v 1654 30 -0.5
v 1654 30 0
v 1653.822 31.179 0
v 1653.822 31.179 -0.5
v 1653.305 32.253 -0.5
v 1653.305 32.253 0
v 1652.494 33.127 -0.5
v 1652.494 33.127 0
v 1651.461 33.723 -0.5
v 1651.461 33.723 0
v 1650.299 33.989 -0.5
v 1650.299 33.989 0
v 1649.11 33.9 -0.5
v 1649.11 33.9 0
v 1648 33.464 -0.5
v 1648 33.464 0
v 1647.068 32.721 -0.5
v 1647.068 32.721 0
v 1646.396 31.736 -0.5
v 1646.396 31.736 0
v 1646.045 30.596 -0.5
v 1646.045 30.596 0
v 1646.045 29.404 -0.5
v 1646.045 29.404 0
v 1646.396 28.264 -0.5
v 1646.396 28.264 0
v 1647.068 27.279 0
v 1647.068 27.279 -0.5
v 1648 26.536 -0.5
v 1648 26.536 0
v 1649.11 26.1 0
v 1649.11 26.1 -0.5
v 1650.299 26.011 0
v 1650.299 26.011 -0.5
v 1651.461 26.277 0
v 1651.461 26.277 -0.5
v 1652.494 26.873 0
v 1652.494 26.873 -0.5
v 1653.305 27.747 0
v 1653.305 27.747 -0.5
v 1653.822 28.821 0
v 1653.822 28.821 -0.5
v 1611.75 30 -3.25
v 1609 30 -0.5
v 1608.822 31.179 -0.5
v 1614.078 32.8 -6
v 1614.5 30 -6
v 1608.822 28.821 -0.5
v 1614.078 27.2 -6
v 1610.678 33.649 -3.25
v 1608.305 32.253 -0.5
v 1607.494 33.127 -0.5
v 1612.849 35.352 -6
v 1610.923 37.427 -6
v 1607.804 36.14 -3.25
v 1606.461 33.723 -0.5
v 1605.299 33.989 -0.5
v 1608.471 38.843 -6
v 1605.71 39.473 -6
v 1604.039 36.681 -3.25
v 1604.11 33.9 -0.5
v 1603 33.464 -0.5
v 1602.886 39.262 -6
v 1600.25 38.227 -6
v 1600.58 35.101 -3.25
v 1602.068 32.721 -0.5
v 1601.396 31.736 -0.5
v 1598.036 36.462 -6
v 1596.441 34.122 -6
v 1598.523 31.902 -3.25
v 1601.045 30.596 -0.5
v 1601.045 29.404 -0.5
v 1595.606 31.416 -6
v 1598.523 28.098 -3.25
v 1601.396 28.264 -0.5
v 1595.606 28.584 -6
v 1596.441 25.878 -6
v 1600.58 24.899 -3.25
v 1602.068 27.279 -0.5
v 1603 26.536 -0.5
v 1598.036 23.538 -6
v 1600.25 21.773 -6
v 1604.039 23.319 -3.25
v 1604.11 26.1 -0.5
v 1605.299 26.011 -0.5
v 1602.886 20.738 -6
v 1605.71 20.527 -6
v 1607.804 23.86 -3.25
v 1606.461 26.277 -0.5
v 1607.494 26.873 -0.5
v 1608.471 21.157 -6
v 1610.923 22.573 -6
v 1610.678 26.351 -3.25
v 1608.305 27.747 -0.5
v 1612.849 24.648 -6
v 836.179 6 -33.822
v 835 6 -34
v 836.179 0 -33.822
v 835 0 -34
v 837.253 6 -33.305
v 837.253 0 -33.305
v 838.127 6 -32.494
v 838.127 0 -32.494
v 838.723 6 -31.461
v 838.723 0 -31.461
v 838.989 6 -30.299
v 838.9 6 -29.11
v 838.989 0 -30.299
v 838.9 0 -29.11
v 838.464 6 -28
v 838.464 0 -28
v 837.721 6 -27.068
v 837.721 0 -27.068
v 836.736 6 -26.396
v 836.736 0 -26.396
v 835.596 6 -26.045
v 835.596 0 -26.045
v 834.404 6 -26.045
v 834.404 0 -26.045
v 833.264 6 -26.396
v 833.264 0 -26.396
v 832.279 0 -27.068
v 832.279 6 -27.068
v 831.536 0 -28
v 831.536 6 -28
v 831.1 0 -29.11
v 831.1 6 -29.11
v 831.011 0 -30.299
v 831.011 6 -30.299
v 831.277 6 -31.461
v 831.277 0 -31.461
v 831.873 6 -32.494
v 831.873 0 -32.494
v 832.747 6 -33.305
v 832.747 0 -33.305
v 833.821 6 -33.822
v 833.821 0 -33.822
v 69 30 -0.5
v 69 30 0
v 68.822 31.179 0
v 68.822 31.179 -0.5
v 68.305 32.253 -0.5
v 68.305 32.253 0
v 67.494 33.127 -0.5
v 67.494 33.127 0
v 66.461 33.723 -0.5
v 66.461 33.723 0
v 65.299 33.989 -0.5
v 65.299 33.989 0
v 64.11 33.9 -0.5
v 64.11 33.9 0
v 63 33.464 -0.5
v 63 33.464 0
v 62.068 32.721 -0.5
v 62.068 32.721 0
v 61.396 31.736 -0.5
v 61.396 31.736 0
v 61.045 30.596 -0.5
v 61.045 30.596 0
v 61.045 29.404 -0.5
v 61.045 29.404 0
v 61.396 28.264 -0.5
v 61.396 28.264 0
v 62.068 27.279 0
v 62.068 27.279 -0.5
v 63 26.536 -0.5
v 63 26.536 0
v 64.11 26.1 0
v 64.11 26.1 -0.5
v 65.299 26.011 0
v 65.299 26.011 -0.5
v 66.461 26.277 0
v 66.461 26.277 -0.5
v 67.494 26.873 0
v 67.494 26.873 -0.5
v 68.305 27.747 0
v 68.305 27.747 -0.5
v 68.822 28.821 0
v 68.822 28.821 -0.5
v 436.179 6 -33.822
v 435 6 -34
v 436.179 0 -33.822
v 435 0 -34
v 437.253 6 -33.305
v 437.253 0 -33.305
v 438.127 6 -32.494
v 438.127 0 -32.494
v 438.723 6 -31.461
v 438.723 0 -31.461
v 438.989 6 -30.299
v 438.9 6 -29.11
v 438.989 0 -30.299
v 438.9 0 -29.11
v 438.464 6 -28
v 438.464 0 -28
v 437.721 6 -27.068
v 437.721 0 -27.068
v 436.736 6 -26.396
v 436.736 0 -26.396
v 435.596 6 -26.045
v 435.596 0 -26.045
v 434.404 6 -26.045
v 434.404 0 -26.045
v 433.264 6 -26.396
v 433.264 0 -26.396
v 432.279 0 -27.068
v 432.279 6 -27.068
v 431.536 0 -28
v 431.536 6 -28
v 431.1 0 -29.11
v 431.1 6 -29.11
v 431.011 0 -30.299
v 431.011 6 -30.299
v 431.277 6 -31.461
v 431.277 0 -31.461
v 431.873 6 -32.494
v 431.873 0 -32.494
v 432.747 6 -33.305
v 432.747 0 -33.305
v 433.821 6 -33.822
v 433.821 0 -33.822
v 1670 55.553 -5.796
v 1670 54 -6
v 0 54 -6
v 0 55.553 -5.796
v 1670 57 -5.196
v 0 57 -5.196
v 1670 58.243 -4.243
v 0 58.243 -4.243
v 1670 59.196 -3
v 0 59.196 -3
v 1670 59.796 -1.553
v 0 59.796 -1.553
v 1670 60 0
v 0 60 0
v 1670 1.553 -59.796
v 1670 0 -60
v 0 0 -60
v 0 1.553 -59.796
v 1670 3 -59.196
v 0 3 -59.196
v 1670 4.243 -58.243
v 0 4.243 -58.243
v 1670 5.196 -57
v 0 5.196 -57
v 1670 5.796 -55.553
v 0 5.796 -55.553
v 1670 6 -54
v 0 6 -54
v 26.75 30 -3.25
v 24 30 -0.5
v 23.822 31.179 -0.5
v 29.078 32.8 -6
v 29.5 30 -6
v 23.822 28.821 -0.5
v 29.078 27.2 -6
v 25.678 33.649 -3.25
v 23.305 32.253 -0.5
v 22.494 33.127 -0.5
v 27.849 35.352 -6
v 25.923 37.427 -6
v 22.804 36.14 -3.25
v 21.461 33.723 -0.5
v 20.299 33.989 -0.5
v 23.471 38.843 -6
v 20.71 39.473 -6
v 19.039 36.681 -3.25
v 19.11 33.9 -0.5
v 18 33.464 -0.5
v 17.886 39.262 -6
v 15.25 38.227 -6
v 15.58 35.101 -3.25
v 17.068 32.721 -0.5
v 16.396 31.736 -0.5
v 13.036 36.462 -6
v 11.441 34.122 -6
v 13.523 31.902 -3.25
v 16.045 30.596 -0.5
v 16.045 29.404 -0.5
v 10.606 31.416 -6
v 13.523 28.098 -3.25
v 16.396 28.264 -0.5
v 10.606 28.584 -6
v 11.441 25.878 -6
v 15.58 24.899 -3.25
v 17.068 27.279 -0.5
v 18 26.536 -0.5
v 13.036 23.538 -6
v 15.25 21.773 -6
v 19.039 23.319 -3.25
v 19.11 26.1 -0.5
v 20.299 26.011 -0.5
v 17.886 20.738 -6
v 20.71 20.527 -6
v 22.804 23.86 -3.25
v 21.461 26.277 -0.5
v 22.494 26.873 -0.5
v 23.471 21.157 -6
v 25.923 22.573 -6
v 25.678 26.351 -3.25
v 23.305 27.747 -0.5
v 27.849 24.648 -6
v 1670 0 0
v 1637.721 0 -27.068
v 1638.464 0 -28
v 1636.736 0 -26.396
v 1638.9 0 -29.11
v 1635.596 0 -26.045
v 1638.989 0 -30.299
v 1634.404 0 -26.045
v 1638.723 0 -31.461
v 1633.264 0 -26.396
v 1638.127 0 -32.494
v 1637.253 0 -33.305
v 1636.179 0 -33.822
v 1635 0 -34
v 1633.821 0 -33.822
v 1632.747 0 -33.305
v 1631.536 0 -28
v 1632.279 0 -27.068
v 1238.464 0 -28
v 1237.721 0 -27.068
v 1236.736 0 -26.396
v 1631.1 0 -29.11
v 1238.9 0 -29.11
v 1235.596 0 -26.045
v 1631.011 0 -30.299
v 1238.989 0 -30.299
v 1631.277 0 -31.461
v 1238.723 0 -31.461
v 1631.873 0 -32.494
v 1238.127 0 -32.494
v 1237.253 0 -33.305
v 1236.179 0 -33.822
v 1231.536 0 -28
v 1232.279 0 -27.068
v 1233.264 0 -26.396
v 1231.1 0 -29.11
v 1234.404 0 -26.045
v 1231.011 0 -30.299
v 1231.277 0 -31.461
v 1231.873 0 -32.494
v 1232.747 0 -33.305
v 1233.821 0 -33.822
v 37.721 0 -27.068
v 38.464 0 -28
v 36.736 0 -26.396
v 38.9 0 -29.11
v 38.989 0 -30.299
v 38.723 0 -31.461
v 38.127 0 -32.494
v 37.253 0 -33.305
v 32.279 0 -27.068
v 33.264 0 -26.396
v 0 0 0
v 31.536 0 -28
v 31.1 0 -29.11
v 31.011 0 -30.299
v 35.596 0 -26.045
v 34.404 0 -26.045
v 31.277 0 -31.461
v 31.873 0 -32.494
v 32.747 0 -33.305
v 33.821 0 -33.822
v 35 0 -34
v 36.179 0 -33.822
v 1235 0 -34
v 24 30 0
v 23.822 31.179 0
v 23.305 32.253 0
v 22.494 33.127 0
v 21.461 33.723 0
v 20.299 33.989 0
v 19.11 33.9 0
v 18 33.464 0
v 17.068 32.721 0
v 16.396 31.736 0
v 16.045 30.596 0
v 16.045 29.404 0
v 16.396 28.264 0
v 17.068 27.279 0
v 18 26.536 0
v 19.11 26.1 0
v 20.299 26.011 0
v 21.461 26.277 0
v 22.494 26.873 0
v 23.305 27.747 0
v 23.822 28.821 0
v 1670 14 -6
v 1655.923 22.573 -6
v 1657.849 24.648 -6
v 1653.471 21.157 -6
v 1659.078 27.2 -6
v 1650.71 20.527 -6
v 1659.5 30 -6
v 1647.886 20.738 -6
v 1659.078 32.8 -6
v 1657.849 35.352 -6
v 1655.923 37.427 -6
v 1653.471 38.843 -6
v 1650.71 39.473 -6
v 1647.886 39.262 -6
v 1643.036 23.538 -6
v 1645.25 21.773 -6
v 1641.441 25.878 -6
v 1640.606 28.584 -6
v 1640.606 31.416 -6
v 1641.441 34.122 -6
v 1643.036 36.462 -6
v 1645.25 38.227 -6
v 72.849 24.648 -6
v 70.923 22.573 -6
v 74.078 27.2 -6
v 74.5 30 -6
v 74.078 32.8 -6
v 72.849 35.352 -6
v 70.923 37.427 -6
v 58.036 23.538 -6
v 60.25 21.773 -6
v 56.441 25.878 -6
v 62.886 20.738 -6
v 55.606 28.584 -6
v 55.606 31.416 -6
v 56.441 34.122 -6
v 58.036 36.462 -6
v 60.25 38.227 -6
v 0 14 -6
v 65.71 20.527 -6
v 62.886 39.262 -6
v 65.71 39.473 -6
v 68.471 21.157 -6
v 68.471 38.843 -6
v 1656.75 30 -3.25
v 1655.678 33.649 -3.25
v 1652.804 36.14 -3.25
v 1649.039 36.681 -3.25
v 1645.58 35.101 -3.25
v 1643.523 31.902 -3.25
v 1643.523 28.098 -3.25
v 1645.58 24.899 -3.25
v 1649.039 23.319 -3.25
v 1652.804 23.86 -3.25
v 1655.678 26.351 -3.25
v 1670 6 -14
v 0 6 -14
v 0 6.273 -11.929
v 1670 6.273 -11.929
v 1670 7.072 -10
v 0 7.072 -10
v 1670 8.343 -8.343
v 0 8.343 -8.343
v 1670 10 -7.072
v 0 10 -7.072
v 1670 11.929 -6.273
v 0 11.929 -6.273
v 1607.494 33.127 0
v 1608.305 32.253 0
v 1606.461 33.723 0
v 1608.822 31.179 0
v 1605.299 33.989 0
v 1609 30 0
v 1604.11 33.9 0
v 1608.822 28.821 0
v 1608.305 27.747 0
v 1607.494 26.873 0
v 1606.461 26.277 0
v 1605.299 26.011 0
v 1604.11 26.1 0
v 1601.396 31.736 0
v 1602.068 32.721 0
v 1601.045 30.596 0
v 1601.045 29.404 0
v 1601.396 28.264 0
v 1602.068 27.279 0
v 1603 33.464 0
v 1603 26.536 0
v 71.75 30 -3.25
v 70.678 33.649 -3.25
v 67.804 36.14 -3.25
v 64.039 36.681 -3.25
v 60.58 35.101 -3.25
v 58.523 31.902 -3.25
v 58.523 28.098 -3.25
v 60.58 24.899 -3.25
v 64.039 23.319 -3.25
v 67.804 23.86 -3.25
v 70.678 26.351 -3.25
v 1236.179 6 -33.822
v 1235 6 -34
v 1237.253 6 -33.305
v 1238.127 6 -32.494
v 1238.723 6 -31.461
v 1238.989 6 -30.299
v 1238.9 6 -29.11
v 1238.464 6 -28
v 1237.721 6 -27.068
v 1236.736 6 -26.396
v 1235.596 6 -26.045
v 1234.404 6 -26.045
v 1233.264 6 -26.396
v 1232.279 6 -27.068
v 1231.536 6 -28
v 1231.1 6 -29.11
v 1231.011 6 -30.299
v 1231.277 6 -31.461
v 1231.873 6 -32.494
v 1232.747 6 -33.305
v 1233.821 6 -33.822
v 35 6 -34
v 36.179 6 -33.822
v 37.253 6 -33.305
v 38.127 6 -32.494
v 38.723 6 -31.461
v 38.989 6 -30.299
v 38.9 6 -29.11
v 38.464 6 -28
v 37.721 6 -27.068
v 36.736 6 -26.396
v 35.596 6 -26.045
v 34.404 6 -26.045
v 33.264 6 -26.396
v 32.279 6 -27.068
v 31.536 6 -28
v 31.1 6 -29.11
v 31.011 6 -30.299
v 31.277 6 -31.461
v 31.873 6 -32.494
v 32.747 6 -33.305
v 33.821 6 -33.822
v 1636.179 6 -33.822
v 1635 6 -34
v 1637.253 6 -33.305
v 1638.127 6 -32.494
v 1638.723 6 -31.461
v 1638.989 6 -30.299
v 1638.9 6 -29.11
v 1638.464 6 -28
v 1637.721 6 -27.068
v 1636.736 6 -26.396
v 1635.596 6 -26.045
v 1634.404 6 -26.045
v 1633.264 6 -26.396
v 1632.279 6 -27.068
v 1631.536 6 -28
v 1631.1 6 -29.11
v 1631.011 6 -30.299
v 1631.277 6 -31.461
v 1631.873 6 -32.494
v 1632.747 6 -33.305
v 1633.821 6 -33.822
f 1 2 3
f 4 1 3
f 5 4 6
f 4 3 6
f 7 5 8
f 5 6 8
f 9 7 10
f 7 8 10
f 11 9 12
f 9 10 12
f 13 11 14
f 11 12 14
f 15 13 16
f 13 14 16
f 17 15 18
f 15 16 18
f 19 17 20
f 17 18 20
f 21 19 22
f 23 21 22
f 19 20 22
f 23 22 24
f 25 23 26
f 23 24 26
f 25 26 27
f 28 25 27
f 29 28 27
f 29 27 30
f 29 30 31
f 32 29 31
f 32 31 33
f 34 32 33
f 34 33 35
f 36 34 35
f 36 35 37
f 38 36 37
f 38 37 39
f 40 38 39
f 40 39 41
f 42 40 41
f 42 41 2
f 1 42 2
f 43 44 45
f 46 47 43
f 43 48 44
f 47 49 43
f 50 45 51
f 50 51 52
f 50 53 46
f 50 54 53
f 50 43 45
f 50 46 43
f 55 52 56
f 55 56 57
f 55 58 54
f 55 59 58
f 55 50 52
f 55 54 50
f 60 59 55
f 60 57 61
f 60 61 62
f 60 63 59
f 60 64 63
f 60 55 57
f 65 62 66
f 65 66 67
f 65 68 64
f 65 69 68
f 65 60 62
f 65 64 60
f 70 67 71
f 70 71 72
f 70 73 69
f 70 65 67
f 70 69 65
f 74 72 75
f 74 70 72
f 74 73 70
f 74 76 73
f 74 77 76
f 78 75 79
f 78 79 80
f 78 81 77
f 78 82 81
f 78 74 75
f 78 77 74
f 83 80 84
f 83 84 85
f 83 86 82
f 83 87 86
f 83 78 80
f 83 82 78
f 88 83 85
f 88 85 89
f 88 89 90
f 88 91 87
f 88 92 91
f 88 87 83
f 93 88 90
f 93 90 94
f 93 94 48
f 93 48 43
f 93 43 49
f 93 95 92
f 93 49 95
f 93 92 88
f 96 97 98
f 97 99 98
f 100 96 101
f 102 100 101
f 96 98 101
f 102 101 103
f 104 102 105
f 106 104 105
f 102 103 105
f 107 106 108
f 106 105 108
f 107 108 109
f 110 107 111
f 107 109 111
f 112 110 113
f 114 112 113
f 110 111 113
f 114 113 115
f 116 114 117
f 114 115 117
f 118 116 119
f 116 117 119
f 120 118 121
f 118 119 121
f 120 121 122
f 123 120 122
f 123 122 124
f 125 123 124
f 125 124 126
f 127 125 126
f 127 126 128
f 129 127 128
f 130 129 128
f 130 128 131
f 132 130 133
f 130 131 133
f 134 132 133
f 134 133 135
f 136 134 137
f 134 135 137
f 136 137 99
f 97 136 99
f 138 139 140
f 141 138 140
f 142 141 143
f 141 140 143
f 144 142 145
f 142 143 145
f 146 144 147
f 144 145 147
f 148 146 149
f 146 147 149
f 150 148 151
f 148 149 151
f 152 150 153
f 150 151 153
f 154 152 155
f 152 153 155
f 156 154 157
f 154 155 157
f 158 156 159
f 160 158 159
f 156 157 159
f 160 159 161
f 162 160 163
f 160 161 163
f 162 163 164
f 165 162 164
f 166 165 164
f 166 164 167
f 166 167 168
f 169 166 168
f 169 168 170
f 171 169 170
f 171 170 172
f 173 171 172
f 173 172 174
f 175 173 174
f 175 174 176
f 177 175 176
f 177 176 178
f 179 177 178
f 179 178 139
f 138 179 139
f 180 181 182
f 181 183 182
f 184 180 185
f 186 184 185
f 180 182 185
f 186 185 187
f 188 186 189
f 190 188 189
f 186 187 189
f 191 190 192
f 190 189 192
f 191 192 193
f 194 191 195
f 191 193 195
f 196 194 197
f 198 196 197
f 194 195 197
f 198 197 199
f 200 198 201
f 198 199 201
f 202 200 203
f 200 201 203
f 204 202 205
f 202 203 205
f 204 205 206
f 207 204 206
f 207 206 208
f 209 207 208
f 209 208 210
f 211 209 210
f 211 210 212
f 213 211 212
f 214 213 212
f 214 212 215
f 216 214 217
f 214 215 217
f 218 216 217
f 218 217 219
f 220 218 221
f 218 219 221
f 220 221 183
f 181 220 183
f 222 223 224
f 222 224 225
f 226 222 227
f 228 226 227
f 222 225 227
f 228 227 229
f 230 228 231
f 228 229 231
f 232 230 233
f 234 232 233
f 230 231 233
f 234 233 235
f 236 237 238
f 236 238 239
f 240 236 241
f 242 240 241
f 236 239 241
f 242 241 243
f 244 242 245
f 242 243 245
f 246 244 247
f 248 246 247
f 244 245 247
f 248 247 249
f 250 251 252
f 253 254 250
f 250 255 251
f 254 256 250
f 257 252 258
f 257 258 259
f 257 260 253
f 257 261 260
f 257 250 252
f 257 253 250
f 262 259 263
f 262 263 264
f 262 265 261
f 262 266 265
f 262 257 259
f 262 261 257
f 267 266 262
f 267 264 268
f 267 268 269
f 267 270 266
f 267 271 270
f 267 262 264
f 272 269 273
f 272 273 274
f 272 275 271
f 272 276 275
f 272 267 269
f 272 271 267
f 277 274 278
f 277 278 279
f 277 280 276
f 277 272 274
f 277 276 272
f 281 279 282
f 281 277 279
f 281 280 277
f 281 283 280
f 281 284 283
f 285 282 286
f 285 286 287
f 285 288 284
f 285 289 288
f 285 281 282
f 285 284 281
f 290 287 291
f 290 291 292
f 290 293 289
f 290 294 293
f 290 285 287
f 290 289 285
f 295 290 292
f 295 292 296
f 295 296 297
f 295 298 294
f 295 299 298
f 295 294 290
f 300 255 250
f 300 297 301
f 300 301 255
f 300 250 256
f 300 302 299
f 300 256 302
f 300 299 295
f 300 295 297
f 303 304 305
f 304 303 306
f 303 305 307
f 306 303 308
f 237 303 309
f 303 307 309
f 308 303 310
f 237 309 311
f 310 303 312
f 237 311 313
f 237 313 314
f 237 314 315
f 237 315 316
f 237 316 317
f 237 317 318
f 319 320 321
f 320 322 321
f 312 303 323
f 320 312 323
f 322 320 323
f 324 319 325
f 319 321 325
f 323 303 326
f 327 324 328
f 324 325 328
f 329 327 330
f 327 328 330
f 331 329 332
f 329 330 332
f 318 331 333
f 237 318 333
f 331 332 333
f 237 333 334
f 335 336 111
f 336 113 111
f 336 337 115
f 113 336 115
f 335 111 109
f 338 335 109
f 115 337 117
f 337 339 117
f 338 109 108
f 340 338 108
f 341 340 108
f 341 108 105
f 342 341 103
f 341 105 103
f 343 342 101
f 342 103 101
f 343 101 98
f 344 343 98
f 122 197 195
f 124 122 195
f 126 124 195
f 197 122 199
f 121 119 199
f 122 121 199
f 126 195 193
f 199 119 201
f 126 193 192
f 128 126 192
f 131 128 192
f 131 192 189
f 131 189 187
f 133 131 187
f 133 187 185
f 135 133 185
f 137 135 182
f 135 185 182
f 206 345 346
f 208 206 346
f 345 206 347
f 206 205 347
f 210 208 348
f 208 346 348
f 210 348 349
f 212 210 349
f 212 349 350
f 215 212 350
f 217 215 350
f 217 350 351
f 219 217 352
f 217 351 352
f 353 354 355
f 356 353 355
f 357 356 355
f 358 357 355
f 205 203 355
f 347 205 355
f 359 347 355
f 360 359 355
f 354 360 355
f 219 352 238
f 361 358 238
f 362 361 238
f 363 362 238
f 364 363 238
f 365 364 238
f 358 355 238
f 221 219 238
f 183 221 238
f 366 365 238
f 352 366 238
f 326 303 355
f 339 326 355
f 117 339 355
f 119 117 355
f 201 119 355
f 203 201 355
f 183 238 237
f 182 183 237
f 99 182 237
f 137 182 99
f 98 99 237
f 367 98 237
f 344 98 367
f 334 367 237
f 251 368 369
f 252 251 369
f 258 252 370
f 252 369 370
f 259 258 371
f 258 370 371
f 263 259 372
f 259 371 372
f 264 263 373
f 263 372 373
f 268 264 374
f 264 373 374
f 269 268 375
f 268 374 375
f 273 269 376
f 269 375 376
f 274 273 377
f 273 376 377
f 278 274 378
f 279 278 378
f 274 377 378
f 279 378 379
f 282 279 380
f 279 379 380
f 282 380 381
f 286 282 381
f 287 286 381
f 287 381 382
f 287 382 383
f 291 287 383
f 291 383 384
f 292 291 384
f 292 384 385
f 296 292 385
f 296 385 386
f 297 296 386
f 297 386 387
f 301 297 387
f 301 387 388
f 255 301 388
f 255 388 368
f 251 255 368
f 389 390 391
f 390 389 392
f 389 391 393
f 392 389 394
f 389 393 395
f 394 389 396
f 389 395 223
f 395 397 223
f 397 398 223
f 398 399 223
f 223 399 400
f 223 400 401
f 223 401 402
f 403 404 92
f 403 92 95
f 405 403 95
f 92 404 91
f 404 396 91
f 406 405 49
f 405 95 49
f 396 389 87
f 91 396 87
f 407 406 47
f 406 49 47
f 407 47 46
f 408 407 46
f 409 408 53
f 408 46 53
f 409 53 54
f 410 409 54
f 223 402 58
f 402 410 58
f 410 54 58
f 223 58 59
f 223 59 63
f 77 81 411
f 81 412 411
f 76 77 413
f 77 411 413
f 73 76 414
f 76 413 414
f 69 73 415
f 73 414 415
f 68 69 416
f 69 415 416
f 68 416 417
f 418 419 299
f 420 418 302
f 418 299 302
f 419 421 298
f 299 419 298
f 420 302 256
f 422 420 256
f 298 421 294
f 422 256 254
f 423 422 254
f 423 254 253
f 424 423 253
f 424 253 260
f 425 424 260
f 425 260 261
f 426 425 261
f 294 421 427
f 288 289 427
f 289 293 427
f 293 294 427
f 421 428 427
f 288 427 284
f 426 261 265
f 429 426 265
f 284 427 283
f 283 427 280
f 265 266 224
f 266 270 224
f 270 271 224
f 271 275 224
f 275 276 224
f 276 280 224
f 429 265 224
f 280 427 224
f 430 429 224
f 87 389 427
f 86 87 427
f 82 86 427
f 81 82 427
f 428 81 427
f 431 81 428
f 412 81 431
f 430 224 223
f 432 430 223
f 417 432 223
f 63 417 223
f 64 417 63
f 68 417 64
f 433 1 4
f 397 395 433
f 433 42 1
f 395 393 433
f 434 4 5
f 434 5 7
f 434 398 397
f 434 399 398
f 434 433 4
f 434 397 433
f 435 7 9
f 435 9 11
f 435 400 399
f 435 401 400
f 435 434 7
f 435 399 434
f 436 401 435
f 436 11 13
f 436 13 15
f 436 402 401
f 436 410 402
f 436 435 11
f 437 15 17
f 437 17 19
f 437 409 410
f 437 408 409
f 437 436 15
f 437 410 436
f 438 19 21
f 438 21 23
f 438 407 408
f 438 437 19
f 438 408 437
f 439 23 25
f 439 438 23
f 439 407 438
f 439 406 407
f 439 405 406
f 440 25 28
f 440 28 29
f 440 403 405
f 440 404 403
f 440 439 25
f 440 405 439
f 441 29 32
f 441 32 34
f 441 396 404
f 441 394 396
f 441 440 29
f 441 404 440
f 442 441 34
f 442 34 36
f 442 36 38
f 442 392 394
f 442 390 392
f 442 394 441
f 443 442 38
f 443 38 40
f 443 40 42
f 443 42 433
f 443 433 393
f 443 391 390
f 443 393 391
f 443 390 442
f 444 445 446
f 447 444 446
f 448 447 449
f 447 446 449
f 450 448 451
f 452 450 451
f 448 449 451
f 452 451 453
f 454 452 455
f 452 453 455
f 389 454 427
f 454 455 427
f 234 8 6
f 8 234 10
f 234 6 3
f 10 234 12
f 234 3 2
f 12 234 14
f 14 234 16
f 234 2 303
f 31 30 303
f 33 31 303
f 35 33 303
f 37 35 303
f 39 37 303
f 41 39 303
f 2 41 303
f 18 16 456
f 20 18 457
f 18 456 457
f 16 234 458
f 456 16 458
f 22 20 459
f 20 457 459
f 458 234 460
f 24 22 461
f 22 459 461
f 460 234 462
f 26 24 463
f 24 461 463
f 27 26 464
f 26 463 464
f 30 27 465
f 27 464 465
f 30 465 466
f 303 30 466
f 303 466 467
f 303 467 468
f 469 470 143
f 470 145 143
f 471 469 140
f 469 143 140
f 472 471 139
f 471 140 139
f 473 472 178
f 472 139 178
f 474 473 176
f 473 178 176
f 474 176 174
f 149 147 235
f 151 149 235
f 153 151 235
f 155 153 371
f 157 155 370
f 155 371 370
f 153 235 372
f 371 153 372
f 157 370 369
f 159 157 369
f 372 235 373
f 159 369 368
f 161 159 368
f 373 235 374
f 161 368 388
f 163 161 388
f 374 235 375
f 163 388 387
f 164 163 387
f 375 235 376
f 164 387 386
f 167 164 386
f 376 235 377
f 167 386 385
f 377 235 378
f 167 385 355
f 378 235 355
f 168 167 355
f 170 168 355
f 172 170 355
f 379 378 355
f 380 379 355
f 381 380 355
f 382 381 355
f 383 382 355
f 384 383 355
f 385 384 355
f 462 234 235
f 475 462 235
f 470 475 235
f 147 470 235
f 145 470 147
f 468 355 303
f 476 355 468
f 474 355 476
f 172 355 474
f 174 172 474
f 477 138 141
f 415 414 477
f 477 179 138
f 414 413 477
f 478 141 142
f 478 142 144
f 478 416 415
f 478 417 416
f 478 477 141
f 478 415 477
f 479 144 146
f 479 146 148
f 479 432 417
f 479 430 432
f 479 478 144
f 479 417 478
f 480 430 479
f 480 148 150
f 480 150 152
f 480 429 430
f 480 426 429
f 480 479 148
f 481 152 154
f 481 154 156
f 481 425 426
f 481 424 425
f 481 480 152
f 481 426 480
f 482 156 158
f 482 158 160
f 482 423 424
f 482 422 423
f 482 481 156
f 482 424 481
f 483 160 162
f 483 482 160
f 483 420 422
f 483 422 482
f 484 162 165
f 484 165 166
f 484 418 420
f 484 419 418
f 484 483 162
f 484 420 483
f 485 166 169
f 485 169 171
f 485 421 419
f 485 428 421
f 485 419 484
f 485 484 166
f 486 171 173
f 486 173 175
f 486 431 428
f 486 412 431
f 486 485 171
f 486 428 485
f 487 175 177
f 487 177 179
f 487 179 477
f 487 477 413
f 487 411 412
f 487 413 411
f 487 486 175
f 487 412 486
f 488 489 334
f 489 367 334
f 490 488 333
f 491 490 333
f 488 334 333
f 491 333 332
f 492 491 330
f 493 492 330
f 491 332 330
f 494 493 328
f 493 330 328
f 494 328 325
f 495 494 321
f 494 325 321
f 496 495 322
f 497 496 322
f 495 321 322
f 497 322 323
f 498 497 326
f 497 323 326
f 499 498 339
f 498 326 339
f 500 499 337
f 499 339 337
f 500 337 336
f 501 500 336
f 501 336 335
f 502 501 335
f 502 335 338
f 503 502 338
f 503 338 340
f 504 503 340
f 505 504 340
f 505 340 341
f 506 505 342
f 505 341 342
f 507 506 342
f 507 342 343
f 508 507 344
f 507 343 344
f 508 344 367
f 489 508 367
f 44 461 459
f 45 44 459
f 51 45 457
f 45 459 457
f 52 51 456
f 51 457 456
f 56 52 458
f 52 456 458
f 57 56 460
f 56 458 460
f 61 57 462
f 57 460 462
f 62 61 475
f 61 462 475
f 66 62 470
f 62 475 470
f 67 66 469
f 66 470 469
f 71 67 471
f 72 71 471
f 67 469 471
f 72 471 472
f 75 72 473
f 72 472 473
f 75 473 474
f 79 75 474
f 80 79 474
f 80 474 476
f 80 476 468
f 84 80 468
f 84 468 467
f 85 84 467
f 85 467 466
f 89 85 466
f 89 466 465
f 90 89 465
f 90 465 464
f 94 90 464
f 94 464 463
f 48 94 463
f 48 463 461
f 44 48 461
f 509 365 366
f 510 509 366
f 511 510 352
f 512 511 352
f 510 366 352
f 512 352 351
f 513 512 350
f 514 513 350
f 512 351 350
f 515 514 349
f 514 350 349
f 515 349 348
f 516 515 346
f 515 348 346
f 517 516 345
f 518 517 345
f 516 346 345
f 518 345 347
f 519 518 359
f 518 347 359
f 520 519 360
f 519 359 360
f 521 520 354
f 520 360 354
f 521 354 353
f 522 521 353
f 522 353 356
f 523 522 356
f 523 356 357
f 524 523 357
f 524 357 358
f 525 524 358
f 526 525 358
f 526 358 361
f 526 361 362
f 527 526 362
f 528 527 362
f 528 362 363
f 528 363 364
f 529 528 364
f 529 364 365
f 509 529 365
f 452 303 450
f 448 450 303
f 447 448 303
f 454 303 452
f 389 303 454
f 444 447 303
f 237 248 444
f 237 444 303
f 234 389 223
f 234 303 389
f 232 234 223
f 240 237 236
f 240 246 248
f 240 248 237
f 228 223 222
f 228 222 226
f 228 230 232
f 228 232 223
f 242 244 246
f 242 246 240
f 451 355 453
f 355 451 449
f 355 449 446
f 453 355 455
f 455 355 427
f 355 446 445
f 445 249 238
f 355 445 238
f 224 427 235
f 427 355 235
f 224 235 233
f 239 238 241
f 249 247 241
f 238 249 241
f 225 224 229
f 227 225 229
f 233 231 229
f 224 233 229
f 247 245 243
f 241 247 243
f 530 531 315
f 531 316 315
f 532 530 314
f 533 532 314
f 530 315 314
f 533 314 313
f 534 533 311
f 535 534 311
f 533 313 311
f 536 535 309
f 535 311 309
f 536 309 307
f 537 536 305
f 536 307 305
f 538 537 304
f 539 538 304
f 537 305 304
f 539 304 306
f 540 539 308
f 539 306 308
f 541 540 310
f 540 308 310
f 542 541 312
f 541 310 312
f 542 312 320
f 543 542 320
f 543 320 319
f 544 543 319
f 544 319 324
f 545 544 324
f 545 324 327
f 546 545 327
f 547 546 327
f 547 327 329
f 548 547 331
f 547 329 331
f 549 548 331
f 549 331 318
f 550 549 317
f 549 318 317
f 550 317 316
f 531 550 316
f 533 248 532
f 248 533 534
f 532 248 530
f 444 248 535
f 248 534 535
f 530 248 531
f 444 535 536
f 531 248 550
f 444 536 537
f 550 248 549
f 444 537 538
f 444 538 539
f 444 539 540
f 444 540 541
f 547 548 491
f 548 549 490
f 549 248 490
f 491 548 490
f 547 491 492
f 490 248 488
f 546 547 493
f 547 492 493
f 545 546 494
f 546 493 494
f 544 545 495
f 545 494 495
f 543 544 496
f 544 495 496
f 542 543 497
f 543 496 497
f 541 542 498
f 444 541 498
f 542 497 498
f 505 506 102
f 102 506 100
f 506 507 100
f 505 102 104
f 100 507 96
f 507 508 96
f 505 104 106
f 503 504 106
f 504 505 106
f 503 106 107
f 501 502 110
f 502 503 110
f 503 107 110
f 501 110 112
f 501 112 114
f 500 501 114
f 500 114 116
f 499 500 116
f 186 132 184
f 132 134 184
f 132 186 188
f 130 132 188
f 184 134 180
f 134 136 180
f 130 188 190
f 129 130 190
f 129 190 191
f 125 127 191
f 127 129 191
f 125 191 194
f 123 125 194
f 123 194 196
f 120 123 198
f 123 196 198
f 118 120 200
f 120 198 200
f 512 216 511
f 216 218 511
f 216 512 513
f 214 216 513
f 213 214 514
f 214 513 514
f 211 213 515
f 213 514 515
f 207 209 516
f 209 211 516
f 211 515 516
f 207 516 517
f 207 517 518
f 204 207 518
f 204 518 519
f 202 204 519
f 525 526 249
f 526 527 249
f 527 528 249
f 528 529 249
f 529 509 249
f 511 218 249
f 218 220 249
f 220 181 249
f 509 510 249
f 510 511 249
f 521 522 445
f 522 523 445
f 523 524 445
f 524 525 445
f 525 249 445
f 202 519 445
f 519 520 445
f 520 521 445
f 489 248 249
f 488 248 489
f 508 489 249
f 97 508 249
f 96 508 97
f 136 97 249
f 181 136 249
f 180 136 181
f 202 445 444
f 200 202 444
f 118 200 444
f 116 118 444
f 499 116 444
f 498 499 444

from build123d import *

# Parameters (mm, degrees)
L_ANGLE_EQUAL_60X60X6_6_DEPTH = 1670
SKETCH14_R                    = 4
CUT_EXTRUDE1_DEPTH            = 1673.1542991
CHAMFER1_SIZE                 = 5.5
SKETCH18_R                    = 4
CUT_EXTRUDE2_DEPTH            = 1673.1542991
LPATTERN1_COUNT               = 5
LPATTERN1_PITCH               = 400
LPATTERN1_COUNT_DIR2          = 5
LPATTERN1_PITCH_DIR2          = 400


with BuildPart() as part:
    # Sketch17 → L angle (equal) 60X60X6(6) (new body)
    with BuildSketch(Plane(origin=(0, 0, 0), x_dir=(0, 0, -1), z_dir=(1, 0, 0))):
        with BuildLine():
            Line((0, 60), (0, 0))
            Line((0, 0), (60, 0))
            ThreePointArc((60, 0), (58.242640687, 4.242640687), (54, 6))
            Line((54, 6), (14, 6))
            ThreePointArc((14, 6), (8.343145751, 8.343145751), (6, 14))
            Line((6, 14), (6, 54))
            ThreePointArc((6, 54), (4.242640687, 58.242640687), (0, 60))
        make_face()
    extrude(amount=L_ANGLE_EQUAL_60X60X6_6_DEPTH)

    # Sketch14 → Cut-Extrude1 (cut, through all)
    with BuildSketch(Plane.XY):
        with Locations((65, 30)):
            Circle(SKETCH14_R)
        with Locations((1605, 30)):
            Circle(SKETCH14_R)
        with Locations((1650, 30)):
            Circle(SKETCH14_R)
        with Locations((20, 30)):
            Circle(SKETCH14_R)
    extrude(amount=-CUT_EXTRUDE1_DEPTH, mode=Mode.SUBTRACT)

    # Chamfer1
    chamfer1_edges = [part.edges().sort_by_distance(p)[0] for p in [
        (16, 30, -6),
        (1646, 30, -6),
        (1601, 30, -6),
        (61, 30, -6),
    ]]
    chamfer(chamfer1_edges, length=CHAMFER1_SIZE)

    # Sketch18 → Cut-Extrude2 (cut, through all)
    with BuildSketch(Plane(origin=(0, 0, 0), x_dir=(-1, 0, 0), z_dir=(0, -1, 0))):
        with Locations(Location((-35, 30, 0), (0, 0, 90))):
            Circle(SKETCH18_R)
    cut_extrude2 = extrude(amount=-CUT_EXTRUDE2_DEPTH, mode=Mode.SUBTRACT)

    # LPattern1: Cut-Extrude2 5 × 5
    with Locations(*[(i * LPATTERN1_PITCH, -j * LPATTERN1_PITCH_DIR2, 0) for i in range(LPATTERN1_COUNT) for j in range(LPATTERN1_COUNT_DIR2) if (i, j) != (0, 0)]):
        add(cut_extrude2, mode=Mode.SUBTRACT)


solid = part.part
